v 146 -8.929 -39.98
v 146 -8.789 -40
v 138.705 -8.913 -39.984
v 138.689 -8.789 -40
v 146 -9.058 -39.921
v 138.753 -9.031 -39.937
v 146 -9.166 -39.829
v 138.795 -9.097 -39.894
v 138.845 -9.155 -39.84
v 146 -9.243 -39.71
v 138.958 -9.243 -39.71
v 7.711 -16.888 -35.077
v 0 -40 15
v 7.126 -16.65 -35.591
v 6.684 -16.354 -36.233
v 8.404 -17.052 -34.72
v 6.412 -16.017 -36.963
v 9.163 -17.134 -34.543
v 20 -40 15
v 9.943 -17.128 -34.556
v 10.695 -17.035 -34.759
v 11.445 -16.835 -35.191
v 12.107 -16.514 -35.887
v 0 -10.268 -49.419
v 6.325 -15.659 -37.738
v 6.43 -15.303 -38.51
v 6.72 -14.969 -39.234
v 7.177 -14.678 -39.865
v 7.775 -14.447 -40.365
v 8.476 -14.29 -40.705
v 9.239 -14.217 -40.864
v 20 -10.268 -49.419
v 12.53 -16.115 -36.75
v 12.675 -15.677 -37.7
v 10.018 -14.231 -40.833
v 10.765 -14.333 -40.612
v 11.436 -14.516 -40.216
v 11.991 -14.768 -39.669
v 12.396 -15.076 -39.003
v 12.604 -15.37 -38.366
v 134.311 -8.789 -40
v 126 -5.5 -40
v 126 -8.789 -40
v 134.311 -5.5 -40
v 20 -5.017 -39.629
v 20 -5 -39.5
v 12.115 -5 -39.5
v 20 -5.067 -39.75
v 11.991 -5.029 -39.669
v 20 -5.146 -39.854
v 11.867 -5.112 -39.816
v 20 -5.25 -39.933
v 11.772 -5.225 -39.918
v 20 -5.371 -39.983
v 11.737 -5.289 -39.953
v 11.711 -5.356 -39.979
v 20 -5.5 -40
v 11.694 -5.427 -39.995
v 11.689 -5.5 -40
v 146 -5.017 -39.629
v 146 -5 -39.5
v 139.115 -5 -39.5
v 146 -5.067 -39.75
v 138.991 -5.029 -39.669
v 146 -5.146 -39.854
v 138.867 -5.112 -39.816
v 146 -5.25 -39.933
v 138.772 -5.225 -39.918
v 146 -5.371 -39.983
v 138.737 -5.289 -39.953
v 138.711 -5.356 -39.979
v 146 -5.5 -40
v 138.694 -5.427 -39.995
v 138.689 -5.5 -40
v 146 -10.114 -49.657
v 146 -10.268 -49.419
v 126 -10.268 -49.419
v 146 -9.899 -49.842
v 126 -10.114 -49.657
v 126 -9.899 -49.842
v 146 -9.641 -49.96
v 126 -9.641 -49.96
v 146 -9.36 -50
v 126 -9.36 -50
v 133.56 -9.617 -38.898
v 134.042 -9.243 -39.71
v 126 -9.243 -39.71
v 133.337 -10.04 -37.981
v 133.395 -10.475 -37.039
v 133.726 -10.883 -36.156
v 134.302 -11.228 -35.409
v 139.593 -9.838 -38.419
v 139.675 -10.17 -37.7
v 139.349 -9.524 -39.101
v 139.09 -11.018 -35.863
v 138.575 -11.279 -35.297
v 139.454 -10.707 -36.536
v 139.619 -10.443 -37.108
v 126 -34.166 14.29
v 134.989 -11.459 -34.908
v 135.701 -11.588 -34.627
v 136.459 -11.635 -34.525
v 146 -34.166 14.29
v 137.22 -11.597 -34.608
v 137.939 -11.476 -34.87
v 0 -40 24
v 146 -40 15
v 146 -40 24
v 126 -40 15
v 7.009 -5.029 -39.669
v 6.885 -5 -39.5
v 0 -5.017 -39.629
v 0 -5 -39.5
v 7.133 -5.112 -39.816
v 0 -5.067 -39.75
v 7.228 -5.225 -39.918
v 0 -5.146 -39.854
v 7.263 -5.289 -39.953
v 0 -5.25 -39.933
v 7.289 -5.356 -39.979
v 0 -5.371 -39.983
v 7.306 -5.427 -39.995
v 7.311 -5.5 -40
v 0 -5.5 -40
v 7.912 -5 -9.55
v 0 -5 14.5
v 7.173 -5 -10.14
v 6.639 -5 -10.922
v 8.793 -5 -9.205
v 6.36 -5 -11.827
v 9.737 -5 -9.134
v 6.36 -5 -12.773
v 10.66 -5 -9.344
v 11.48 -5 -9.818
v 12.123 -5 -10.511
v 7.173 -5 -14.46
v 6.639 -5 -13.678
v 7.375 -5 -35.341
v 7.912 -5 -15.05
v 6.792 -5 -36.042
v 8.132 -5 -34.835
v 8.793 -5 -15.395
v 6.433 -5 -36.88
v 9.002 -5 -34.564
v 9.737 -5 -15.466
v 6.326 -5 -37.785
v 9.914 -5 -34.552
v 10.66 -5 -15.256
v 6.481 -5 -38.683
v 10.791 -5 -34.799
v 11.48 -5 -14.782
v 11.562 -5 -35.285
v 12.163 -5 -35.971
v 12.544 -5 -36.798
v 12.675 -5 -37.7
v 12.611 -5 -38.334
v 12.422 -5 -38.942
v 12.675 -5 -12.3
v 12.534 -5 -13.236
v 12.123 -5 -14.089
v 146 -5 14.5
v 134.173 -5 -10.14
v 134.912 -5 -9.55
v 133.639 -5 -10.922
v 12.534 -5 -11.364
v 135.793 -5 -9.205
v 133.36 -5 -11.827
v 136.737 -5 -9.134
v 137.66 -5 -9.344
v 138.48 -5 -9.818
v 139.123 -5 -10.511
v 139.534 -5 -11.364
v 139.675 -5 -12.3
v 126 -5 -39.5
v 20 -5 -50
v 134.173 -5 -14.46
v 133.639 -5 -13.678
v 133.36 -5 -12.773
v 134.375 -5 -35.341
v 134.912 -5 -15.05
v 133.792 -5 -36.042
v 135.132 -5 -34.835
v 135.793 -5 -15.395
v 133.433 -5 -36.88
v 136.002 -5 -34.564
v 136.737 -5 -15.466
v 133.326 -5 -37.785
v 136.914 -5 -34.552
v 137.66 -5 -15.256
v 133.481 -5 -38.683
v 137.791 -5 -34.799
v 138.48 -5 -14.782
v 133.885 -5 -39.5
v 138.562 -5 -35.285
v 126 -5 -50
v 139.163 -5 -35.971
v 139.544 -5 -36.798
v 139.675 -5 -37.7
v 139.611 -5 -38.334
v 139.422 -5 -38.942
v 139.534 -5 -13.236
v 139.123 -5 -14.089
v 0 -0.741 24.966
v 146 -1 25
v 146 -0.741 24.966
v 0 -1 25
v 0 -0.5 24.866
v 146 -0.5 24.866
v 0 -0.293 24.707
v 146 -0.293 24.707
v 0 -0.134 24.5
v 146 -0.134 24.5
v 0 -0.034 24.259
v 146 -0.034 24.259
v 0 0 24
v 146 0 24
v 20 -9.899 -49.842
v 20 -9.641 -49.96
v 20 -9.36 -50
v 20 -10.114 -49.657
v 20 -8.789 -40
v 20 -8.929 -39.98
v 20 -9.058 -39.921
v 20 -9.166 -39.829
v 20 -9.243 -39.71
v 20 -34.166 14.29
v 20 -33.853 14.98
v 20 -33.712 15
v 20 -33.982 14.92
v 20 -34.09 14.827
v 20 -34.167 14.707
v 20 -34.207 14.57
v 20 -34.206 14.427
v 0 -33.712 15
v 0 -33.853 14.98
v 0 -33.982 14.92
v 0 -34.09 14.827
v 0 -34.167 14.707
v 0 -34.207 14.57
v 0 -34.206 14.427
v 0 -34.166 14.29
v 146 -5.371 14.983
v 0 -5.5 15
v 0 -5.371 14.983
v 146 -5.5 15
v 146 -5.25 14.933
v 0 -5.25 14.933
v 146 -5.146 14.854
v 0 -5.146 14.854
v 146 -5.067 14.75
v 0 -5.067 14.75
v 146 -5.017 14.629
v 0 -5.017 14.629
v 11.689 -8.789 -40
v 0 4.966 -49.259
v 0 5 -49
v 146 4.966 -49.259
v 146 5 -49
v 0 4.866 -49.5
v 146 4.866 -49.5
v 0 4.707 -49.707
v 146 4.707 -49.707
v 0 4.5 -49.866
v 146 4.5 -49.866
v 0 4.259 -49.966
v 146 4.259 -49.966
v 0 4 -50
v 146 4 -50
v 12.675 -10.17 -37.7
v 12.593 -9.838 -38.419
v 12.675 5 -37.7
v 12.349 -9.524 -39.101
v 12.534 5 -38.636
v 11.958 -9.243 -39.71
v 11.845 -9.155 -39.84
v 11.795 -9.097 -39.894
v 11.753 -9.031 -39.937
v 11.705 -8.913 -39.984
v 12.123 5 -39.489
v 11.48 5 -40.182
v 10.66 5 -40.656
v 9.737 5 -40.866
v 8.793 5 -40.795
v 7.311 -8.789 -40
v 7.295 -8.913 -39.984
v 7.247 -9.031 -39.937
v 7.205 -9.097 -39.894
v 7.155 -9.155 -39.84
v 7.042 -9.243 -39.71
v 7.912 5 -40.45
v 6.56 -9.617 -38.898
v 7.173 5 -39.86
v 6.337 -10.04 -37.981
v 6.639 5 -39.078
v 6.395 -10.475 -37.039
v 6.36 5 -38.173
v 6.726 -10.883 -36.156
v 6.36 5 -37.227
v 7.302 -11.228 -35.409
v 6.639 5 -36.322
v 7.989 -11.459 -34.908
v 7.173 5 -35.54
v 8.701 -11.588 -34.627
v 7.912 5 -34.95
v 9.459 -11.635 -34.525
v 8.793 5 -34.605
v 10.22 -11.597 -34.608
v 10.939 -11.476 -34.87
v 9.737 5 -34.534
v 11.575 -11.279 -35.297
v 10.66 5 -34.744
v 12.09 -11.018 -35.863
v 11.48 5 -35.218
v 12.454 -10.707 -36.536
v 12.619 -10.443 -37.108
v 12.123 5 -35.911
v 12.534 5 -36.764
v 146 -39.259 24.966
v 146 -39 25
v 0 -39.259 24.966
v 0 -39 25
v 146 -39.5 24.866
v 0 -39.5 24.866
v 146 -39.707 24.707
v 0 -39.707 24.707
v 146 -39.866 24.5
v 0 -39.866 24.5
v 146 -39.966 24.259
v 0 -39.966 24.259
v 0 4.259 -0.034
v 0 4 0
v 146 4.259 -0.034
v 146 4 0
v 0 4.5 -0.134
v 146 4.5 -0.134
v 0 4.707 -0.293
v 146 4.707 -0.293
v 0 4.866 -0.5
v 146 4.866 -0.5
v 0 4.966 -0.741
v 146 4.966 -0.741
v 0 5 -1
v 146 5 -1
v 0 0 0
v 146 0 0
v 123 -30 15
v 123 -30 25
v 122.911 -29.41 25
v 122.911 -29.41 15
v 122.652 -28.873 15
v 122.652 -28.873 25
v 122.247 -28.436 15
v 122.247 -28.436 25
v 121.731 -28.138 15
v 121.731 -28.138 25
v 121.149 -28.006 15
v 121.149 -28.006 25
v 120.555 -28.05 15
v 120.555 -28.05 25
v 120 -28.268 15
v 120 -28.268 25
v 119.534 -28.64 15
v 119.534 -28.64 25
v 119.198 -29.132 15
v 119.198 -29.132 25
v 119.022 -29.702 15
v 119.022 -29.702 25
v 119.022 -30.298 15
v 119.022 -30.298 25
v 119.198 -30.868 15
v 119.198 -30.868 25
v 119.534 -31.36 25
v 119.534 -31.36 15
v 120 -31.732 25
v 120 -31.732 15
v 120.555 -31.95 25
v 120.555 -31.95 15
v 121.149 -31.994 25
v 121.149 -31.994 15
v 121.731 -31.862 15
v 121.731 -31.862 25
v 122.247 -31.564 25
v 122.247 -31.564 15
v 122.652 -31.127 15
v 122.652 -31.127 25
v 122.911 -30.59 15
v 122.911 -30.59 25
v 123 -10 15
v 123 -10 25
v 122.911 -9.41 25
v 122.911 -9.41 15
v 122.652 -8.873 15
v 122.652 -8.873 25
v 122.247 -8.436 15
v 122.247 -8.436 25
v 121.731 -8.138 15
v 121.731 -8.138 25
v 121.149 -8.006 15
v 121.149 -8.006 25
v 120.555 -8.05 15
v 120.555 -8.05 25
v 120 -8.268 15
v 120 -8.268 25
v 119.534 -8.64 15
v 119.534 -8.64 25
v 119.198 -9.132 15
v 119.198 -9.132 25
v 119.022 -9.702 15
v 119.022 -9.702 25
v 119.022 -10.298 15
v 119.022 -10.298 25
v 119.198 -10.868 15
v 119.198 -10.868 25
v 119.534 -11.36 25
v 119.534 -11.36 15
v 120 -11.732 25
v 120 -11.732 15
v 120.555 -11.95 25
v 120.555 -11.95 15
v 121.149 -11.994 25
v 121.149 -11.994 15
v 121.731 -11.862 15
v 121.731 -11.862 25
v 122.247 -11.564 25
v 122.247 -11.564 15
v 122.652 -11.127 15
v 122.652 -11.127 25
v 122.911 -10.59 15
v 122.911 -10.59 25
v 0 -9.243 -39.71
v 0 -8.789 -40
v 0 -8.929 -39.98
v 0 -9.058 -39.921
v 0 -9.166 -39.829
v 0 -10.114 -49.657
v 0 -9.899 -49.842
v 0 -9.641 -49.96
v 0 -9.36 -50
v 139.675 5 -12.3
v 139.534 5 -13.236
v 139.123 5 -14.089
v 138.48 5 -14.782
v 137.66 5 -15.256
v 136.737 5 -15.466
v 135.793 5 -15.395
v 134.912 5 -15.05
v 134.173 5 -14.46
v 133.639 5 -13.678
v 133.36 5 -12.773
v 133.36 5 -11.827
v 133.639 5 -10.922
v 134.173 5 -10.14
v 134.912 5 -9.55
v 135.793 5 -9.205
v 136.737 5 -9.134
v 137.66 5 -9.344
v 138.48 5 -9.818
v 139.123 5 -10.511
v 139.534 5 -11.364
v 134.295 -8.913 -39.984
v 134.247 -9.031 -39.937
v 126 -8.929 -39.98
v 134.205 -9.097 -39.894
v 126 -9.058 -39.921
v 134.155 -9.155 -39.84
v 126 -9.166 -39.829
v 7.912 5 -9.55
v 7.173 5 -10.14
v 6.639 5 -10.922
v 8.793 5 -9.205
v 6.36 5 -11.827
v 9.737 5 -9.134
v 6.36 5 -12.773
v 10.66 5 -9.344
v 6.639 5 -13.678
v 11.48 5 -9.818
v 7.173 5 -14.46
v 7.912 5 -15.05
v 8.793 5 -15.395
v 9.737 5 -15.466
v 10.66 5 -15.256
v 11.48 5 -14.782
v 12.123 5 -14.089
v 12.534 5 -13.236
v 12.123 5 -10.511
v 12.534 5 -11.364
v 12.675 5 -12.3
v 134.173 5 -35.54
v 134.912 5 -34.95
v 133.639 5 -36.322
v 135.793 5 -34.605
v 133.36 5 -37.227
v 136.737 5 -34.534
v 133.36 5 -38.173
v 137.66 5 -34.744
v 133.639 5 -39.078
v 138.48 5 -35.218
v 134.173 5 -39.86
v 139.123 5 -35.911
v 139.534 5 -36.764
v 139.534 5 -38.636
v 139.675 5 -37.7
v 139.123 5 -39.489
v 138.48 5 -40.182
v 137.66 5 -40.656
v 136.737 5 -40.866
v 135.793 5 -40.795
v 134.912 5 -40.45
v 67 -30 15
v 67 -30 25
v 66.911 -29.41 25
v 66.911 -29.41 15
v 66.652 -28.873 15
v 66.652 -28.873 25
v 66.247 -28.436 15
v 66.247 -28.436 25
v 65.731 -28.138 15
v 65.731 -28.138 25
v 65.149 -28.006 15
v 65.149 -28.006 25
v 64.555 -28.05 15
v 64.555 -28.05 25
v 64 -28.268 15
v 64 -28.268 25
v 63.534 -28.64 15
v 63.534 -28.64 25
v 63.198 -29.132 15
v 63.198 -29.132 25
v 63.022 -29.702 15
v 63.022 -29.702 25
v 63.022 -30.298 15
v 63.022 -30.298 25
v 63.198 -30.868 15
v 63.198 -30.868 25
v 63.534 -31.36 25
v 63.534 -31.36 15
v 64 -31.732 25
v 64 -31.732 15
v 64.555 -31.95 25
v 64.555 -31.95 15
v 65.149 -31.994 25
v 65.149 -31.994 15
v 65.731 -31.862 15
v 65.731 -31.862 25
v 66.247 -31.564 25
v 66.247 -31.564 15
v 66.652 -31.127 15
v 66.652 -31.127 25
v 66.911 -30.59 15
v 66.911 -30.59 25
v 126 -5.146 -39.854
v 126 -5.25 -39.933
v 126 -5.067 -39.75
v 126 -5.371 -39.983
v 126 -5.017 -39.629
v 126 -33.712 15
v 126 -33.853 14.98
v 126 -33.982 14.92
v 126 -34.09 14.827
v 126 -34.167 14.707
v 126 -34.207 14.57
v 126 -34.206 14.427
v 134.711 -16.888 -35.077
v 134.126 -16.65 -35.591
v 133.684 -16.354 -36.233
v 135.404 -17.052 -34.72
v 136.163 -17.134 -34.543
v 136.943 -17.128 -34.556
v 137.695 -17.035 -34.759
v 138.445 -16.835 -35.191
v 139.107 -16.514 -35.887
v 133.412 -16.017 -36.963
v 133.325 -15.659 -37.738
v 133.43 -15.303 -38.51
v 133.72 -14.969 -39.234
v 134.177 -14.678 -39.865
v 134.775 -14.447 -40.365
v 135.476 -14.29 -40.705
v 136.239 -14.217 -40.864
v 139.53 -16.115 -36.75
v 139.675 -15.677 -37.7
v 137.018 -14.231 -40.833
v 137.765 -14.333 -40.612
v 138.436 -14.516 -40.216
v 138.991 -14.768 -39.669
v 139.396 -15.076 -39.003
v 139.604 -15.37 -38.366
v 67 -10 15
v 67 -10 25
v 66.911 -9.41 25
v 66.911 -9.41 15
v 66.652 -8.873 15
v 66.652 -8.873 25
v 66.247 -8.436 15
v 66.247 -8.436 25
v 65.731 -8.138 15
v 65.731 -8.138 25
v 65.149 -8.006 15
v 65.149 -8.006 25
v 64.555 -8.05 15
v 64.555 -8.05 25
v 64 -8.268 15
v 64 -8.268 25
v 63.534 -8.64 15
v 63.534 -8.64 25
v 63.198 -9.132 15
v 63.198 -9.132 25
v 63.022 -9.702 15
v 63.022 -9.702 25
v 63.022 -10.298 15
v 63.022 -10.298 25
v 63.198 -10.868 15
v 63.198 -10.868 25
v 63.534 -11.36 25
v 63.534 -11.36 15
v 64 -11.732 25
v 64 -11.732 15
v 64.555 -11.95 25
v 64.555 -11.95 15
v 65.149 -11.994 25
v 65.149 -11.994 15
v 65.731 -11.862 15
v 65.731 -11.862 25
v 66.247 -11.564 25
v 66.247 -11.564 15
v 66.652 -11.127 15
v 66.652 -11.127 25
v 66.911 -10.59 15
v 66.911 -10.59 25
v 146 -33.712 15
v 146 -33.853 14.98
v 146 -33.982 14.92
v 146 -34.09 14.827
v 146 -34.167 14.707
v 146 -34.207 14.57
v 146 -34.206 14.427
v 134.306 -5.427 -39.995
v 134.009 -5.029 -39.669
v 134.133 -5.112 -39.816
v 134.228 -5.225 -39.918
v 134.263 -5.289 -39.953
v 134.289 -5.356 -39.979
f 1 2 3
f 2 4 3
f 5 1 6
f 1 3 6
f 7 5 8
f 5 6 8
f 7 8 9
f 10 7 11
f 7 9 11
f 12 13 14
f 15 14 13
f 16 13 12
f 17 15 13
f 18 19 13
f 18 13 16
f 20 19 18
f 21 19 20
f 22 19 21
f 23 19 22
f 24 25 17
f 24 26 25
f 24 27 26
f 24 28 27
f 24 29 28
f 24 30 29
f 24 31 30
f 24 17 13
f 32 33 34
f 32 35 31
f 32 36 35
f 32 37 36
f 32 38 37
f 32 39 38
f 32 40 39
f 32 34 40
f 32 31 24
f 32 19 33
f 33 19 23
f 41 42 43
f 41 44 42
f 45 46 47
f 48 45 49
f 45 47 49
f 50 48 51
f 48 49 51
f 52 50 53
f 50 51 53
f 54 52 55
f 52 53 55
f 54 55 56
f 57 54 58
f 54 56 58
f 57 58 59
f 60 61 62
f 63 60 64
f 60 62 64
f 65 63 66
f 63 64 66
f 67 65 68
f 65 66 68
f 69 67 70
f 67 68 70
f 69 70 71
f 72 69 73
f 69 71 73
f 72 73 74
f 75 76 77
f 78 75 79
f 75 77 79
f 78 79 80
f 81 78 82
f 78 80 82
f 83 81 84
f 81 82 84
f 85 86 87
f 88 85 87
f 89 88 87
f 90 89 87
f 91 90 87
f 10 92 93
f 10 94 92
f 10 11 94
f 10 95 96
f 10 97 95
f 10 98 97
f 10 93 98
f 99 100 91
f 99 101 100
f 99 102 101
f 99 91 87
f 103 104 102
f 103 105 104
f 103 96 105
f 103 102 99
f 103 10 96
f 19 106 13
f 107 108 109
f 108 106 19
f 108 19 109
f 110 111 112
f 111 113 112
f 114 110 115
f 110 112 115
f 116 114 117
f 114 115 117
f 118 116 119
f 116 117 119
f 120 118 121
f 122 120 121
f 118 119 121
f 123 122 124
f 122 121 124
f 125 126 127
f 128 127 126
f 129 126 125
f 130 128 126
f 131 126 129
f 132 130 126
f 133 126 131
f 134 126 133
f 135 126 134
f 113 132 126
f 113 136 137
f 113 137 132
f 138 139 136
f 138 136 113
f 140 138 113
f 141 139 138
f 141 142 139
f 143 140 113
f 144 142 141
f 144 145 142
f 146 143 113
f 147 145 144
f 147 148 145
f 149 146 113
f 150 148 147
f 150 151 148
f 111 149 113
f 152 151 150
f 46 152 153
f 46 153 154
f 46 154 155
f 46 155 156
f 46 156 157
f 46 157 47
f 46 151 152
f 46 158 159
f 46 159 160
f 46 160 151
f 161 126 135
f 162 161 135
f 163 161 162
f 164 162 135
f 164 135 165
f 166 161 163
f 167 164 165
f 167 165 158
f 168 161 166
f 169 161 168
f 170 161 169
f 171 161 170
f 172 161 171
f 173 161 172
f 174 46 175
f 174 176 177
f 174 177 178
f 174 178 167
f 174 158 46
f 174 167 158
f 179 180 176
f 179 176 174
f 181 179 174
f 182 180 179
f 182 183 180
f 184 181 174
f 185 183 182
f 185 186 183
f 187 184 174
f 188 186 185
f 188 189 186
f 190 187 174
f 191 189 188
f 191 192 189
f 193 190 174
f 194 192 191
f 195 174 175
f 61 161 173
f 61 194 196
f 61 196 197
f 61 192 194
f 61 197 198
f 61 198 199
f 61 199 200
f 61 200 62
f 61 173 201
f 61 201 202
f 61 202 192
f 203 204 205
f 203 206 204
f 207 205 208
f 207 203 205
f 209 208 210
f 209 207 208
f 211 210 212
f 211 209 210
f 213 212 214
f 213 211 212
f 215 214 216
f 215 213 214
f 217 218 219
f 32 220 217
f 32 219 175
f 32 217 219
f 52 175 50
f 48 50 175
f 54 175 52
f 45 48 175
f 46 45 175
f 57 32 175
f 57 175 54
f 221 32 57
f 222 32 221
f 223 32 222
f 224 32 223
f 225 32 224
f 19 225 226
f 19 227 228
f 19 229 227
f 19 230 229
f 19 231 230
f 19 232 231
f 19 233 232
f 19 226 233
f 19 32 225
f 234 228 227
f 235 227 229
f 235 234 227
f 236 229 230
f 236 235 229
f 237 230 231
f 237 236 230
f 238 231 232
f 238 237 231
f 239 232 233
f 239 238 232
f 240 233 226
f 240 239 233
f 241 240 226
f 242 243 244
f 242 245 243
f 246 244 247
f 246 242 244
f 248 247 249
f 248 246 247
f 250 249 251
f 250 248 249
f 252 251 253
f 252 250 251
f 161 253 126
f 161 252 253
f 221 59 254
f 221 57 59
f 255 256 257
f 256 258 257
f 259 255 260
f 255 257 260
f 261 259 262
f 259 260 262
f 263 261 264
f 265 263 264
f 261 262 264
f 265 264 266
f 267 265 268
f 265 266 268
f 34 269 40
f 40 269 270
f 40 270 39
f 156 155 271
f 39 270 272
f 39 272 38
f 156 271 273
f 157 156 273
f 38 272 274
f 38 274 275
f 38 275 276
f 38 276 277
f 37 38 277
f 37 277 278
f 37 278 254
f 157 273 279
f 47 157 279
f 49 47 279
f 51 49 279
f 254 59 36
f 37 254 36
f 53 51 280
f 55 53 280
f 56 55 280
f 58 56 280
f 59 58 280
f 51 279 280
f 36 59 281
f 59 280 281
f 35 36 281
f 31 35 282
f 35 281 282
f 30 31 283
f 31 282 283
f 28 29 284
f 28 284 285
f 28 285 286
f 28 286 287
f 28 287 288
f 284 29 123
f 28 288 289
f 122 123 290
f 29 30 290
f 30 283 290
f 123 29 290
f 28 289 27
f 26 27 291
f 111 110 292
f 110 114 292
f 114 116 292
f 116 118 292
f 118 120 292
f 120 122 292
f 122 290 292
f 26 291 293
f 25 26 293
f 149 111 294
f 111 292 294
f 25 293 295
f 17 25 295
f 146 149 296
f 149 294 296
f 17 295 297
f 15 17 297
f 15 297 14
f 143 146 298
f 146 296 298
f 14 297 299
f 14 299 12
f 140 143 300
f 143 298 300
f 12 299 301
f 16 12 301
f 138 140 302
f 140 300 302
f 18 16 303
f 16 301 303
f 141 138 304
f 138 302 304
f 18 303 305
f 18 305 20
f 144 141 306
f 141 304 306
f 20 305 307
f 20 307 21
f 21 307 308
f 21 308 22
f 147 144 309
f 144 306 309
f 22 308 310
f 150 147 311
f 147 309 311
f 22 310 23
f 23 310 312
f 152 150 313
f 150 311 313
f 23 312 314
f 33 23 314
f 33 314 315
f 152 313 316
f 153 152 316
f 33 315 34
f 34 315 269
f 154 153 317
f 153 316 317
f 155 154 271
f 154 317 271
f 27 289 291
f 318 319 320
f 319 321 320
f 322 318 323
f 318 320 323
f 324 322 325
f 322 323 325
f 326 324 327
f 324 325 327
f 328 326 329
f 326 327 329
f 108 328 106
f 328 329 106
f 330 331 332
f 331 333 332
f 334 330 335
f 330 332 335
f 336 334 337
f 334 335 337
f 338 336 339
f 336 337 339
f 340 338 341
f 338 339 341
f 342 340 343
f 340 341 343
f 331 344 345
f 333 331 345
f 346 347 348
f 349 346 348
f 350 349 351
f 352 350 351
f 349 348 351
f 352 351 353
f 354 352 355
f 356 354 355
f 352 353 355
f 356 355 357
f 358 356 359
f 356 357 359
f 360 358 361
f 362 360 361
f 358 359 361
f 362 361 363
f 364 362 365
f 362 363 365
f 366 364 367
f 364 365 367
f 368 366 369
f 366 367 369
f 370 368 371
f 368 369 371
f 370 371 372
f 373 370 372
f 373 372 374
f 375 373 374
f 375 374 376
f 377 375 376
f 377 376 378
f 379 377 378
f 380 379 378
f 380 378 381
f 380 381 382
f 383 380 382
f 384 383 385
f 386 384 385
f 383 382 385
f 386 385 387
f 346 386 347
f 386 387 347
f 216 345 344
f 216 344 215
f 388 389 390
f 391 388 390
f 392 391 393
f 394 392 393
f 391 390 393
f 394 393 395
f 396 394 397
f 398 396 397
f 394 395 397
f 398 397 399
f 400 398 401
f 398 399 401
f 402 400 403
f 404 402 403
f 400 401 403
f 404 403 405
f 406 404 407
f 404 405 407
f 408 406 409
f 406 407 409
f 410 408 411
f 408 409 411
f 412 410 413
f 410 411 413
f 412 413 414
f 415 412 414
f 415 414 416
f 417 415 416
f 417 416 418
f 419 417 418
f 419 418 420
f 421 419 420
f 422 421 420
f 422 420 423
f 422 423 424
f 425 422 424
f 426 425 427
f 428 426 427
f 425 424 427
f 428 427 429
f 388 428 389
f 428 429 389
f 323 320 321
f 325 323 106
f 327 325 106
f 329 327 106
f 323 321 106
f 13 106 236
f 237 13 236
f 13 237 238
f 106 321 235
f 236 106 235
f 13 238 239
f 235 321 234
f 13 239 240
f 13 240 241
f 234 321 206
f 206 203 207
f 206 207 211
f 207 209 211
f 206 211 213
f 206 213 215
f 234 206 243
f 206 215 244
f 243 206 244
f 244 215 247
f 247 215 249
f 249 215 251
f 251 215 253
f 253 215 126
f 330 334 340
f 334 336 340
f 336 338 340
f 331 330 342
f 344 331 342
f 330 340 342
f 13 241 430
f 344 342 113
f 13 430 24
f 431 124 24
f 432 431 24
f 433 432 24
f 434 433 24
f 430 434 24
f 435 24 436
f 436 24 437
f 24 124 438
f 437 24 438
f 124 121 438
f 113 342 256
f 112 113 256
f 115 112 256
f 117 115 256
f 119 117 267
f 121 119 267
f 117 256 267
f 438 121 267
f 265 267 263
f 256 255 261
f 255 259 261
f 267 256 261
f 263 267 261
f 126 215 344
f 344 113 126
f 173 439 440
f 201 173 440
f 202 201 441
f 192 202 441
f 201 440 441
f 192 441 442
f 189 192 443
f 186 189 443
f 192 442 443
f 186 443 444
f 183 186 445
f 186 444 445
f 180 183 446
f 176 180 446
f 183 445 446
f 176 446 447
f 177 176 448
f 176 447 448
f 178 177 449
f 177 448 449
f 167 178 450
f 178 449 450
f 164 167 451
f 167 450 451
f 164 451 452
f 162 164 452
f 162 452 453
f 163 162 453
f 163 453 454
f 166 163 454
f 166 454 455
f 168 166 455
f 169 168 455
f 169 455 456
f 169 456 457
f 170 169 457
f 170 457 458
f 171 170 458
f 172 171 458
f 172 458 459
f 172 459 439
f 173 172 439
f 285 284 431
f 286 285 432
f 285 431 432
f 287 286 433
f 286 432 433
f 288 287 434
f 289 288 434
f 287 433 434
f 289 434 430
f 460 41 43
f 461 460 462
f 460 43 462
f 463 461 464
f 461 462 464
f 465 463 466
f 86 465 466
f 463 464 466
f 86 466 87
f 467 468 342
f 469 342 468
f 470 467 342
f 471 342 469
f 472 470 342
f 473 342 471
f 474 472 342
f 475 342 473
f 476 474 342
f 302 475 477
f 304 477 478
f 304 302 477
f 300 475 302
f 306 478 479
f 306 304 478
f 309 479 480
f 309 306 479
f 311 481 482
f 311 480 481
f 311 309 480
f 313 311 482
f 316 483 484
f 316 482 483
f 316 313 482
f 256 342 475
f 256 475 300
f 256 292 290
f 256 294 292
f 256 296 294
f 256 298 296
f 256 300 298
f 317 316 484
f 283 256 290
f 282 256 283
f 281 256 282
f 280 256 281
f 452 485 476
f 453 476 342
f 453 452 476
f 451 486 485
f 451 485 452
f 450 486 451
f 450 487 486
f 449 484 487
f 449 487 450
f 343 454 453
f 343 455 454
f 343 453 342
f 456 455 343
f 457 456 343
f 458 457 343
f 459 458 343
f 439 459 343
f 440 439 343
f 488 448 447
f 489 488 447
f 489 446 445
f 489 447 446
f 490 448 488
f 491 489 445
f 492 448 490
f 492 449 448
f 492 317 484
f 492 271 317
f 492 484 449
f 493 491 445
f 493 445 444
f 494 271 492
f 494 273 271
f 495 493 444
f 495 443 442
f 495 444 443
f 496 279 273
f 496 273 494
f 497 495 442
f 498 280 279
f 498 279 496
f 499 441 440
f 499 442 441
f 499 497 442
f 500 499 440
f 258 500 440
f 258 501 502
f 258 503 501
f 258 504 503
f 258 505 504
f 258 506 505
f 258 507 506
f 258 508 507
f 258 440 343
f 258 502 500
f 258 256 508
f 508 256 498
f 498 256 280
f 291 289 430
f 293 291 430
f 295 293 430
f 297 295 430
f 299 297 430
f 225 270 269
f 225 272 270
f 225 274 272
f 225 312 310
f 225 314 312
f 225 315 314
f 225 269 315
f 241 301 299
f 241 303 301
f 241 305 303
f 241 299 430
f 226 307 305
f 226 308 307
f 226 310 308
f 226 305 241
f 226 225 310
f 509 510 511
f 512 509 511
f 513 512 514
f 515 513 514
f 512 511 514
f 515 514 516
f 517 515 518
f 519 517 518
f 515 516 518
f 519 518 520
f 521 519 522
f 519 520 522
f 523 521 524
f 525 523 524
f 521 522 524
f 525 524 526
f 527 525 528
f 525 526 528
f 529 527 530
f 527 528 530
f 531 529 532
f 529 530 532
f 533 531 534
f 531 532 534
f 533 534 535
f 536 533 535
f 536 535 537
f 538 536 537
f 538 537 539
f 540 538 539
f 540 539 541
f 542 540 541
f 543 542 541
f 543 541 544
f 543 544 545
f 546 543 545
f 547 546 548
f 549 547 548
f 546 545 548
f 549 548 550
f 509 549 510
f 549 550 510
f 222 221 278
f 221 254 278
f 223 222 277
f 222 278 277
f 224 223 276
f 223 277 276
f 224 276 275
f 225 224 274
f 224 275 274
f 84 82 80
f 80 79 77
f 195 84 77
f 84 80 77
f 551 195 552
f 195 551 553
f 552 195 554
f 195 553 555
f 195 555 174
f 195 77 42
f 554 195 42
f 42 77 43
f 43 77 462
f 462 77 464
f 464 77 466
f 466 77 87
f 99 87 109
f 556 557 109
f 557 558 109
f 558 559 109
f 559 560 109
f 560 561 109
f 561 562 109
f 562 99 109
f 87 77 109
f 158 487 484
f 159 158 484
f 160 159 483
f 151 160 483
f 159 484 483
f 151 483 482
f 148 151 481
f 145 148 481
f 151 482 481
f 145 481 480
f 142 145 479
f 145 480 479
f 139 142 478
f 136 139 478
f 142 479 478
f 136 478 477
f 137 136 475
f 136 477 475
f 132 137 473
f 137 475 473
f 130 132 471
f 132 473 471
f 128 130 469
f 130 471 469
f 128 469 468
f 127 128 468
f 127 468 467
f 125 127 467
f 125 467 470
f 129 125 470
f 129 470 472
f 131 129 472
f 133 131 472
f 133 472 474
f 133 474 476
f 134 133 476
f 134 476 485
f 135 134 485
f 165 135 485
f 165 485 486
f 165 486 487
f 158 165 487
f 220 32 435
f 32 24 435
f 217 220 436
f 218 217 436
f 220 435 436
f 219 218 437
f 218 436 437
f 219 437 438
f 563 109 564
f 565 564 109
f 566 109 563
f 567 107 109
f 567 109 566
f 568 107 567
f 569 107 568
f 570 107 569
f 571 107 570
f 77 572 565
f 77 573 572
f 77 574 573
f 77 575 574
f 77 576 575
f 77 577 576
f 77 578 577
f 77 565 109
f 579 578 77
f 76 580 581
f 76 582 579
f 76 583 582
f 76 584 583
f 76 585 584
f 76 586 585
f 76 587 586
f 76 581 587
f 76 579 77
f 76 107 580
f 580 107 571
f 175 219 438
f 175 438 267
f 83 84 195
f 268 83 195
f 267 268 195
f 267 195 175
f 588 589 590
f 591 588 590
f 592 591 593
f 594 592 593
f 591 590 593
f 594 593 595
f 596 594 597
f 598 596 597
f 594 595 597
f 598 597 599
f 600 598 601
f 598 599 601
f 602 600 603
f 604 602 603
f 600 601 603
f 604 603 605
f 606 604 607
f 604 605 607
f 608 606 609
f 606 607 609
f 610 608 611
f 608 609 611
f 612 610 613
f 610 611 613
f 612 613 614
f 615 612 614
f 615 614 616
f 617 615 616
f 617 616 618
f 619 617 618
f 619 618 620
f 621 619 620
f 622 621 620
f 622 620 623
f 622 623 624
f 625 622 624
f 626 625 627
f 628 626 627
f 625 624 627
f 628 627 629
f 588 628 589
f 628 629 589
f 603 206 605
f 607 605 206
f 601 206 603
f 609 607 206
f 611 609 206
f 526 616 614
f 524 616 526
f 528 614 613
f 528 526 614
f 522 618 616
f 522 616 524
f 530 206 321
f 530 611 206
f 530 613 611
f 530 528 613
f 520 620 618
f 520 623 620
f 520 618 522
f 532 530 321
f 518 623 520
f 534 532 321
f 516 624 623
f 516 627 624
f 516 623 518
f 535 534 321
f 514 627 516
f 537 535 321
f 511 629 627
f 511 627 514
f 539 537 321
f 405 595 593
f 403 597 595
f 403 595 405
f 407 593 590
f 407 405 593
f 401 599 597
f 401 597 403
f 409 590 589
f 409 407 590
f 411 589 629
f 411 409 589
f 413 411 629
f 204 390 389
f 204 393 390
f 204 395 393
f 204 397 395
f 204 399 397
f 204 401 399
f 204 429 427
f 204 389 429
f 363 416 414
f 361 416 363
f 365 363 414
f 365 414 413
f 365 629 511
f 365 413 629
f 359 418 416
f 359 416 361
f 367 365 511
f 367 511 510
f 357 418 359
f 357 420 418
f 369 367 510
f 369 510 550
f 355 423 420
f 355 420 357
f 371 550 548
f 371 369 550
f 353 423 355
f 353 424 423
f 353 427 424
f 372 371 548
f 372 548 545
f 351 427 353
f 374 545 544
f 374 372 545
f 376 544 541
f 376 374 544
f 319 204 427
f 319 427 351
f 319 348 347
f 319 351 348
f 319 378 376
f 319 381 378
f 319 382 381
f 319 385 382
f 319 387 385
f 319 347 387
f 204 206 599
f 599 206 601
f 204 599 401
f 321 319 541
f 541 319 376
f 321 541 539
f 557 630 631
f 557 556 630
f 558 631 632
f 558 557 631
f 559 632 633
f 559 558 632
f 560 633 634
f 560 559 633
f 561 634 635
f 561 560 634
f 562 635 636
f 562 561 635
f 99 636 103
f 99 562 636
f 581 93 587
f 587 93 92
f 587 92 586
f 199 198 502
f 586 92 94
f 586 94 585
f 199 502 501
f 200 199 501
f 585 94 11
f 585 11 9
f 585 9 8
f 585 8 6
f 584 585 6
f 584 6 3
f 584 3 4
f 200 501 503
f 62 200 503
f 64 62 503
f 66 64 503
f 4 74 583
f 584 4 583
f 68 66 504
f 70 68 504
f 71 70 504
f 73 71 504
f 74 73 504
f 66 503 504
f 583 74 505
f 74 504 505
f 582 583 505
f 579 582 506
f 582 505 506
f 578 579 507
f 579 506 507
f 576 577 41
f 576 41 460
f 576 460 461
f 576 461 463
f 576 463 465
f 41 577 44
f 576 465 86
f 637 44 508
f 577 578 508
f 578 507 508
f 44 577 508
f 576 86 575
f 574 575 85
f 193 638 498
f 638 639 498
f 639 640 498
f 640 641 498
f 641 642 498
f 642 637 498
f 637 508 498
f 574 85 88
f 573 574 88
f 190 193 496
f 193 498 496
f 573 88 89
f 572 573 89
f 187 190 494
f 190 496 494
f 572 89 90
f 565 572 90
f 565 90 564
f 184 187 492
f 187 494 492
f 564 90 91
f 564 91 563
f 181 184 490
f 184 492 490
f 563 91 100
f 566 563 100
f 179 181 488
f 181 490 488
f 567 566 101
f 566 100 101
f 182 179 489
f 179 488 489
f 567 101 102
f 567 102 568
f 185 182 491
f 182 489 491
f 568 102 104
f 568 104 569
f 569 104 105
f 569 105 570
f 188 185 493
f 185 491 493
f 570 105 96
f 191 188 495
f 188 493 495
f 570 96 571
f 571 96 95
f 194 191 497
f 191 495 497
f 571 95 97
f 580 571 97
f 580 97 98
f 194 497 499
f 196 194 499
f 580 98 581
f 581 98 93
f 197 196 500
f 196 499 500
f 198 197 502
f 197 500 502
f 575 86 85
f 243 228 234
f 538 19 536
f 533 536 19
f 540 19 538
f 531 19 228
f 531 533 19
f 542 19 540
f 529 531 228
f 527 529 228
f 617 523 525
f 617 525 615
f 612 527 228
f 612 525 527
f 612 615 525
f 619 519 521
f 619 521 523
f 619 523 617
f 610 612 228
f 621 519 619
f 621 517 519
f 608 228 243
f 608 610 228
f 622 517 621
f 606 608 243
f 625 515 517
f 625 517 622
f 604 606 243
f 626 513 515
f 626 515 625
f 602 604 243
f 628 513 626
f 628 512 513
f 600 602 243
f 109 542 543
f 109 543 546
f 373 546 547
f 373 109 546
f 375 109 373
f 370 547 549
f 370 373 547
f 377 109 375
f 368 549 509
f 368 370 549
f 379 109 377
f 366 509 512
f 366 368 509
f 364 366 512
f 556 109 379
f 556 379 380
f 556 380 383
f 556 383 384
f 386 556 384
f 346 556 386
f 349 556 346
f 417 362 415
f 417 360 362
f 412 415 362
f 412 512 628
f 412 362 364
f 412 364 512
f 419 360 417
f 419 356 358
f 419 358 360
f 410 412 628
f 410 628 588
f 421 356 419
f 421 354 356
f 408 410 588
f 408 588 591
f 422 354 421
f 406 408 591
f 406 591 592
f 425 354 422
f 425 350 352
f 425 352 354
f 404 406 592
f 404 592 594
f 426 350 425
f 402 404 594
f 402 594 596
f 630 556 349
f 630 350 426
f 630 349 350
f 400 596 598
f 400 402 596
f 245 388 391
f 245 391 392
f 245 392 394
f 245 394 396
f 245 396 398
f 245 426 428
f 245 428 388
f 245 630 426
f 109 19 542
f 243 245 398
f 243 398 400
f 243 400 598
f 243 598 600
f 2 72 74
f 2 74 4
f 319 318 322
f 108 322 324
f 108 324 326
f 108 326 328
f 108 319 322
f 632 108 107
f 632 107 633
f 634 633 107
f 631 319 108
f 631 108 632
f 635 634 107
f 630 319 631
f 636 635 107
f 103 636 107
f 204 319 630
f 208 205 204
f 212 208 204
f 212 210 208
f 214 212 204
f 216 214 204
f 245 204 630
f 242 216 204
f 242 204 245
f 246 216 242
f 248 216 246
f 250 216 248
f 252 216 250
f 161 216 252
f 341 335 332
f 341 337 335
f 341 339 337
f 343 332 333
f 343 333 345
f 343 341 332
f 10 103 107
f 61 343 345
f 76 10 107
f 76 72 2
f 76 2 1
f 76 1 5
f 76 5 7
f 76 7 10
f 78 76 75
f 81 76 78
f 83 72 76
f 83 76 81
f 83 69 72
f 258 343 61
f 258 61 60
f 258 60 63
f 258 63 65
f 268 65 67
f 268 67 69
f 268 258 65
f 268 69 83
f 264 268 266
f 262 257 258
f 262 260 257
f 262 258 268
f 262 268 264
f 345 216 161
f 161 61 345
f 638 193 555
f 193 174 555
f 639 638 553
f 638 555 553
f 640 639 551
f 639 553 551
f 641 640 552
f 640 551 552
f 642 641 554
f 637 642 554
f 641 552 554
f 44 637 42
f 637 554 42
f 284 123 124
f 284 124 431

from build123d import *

# Parameters (mm, degrees)
SKETCH1_W           = 146
SKETCH1_H           = 50
BOSS_EXTRUDE1_DEPTH = 5
BOSS_EXTRUDE2_DEPTH = 146
SKETCH4_R           = 3.175
CUT_EXTRUDE1_DEPTH  = 25
SKETCH11_R          = 2
CUT_EXTRUDE3_DEPTH  = 10
SKETCH13_W          = 106
SKETCH13_H          = 65
CUT_EXTRUDE5_DEPTH  = 35
FILLET1_R           = 0.5
FILLET2_R           = 1


with BuildPart() as part:
    # Sketch1 → Boss-Extrude1 (new body)
    with BuildSketch(Plane(origin=(0, 0, 0), x_dir=(1, 0, 0), z_dir=(0, 1, 0))):
        with Locations((73, 25)):
            Rectangle(SKETCH1_W, SKETCH1_H)
    extrude(amount=BOSS_EXTRUDE1_DEPTH)

    # Sketch10 → Boss-Extrude2 (add)
    with BuildSketch(Plane(origin=(146, 0, 0), x_dir=(0, 0, -1), z_dir=(1, 0, 0))):
        Polygon((-25, 0), (-25, -40), (-15, -40), (50, -10), (50, 0), align=None)
        Polygon((-15, -34.493146), (-15, -5), (40, -5), (40, -9.10853), align=None, mode=Mode.SUBTRACT)
    extrude(amount=-BOSS_EXTRUDE2_DEPTH)

    # Sketch4 → Cut-Extrude1 (cut)
    with BuildSketch(Plane(origin=(0, 5, 0), x_dir=(1, 0, 0), z_dir=(0, 1, 0))):
        with Locations((9.5, 37.7)):
            Circle(SKETCH4_R)
        with Locations((9.5, 12.3)):
            Circle(SKETCH4_R)
        with Locations((136.5, 12.3)):
            Circle(SKETCH4_R)
        with Locations((136.5, 37.7)):
            Circle(SKETCH4_R)
    extrude(amount=-CUT_EXTRUDE1_DEPTH, mode=Mode.SUBTRACT)

    # Sketch11 → Cut-Extrude3 (cut)
    with BuildSketch(Plane.XY.offset(25)):
        with Locations((121, -30)):
            Circle(SKETCH11_R)
        with Locations((65, -30)):
            Circle(SKETCH11_R)
        with Locations((65, -10)):
            Circle(SKETCH11_R)
        with Locations((121, -10)):
            Circle(SKETCH11_R)
    extrude(amount=-CUT_EXTRUDE3_DEPTH, mode=Mode.SUBTRACT)

    # Sketch13 → Cut-Extrude5 (cut)
    with BuildSketch(Plane.XZ.offset(40)):
        with Locations((73, -17.5)):
            Rectangle(SKETCH13_W, SKETCH13_H)
    extrude(amount=-CUT_EXTRUDE5_DEPTH, mode=Mode.SUBTRACT)

    # Fillet1
    fillet1_edges = [part.edges().sort_by_distance(p)[0] for p in [
        (73, -5, 15),
        (10, -34.493146, 15),
        (136, -34.493146, 15),
        (15.844375, -9.10853, -40),
        (15.844375, -5, -40),
        (130.155625, -9.10853, -40),
        (130.155625, -5, -40),
        (142.344375, -5, -40),
        (142.344375, -9.10853, -40),
        (3.655625, -5, -40),
        (3.655625, -9.10853, -40),
    ]]
    fillet(fillet1_edges, radius=FILLET1_R)

    # Fillet2
    fillet2_edges = [part.edges().sort_by_distance(p)[0] for p in [
        (73, 0, 25),
        (73, 5, -50),
        (10, -10, -50),
        (73, -40, 25),
        (73, 5, 0),
        (136, -10, -50),
    ]]
    fillet(fillet2_edges, radius=FILLET2_R)


solid = part.part
